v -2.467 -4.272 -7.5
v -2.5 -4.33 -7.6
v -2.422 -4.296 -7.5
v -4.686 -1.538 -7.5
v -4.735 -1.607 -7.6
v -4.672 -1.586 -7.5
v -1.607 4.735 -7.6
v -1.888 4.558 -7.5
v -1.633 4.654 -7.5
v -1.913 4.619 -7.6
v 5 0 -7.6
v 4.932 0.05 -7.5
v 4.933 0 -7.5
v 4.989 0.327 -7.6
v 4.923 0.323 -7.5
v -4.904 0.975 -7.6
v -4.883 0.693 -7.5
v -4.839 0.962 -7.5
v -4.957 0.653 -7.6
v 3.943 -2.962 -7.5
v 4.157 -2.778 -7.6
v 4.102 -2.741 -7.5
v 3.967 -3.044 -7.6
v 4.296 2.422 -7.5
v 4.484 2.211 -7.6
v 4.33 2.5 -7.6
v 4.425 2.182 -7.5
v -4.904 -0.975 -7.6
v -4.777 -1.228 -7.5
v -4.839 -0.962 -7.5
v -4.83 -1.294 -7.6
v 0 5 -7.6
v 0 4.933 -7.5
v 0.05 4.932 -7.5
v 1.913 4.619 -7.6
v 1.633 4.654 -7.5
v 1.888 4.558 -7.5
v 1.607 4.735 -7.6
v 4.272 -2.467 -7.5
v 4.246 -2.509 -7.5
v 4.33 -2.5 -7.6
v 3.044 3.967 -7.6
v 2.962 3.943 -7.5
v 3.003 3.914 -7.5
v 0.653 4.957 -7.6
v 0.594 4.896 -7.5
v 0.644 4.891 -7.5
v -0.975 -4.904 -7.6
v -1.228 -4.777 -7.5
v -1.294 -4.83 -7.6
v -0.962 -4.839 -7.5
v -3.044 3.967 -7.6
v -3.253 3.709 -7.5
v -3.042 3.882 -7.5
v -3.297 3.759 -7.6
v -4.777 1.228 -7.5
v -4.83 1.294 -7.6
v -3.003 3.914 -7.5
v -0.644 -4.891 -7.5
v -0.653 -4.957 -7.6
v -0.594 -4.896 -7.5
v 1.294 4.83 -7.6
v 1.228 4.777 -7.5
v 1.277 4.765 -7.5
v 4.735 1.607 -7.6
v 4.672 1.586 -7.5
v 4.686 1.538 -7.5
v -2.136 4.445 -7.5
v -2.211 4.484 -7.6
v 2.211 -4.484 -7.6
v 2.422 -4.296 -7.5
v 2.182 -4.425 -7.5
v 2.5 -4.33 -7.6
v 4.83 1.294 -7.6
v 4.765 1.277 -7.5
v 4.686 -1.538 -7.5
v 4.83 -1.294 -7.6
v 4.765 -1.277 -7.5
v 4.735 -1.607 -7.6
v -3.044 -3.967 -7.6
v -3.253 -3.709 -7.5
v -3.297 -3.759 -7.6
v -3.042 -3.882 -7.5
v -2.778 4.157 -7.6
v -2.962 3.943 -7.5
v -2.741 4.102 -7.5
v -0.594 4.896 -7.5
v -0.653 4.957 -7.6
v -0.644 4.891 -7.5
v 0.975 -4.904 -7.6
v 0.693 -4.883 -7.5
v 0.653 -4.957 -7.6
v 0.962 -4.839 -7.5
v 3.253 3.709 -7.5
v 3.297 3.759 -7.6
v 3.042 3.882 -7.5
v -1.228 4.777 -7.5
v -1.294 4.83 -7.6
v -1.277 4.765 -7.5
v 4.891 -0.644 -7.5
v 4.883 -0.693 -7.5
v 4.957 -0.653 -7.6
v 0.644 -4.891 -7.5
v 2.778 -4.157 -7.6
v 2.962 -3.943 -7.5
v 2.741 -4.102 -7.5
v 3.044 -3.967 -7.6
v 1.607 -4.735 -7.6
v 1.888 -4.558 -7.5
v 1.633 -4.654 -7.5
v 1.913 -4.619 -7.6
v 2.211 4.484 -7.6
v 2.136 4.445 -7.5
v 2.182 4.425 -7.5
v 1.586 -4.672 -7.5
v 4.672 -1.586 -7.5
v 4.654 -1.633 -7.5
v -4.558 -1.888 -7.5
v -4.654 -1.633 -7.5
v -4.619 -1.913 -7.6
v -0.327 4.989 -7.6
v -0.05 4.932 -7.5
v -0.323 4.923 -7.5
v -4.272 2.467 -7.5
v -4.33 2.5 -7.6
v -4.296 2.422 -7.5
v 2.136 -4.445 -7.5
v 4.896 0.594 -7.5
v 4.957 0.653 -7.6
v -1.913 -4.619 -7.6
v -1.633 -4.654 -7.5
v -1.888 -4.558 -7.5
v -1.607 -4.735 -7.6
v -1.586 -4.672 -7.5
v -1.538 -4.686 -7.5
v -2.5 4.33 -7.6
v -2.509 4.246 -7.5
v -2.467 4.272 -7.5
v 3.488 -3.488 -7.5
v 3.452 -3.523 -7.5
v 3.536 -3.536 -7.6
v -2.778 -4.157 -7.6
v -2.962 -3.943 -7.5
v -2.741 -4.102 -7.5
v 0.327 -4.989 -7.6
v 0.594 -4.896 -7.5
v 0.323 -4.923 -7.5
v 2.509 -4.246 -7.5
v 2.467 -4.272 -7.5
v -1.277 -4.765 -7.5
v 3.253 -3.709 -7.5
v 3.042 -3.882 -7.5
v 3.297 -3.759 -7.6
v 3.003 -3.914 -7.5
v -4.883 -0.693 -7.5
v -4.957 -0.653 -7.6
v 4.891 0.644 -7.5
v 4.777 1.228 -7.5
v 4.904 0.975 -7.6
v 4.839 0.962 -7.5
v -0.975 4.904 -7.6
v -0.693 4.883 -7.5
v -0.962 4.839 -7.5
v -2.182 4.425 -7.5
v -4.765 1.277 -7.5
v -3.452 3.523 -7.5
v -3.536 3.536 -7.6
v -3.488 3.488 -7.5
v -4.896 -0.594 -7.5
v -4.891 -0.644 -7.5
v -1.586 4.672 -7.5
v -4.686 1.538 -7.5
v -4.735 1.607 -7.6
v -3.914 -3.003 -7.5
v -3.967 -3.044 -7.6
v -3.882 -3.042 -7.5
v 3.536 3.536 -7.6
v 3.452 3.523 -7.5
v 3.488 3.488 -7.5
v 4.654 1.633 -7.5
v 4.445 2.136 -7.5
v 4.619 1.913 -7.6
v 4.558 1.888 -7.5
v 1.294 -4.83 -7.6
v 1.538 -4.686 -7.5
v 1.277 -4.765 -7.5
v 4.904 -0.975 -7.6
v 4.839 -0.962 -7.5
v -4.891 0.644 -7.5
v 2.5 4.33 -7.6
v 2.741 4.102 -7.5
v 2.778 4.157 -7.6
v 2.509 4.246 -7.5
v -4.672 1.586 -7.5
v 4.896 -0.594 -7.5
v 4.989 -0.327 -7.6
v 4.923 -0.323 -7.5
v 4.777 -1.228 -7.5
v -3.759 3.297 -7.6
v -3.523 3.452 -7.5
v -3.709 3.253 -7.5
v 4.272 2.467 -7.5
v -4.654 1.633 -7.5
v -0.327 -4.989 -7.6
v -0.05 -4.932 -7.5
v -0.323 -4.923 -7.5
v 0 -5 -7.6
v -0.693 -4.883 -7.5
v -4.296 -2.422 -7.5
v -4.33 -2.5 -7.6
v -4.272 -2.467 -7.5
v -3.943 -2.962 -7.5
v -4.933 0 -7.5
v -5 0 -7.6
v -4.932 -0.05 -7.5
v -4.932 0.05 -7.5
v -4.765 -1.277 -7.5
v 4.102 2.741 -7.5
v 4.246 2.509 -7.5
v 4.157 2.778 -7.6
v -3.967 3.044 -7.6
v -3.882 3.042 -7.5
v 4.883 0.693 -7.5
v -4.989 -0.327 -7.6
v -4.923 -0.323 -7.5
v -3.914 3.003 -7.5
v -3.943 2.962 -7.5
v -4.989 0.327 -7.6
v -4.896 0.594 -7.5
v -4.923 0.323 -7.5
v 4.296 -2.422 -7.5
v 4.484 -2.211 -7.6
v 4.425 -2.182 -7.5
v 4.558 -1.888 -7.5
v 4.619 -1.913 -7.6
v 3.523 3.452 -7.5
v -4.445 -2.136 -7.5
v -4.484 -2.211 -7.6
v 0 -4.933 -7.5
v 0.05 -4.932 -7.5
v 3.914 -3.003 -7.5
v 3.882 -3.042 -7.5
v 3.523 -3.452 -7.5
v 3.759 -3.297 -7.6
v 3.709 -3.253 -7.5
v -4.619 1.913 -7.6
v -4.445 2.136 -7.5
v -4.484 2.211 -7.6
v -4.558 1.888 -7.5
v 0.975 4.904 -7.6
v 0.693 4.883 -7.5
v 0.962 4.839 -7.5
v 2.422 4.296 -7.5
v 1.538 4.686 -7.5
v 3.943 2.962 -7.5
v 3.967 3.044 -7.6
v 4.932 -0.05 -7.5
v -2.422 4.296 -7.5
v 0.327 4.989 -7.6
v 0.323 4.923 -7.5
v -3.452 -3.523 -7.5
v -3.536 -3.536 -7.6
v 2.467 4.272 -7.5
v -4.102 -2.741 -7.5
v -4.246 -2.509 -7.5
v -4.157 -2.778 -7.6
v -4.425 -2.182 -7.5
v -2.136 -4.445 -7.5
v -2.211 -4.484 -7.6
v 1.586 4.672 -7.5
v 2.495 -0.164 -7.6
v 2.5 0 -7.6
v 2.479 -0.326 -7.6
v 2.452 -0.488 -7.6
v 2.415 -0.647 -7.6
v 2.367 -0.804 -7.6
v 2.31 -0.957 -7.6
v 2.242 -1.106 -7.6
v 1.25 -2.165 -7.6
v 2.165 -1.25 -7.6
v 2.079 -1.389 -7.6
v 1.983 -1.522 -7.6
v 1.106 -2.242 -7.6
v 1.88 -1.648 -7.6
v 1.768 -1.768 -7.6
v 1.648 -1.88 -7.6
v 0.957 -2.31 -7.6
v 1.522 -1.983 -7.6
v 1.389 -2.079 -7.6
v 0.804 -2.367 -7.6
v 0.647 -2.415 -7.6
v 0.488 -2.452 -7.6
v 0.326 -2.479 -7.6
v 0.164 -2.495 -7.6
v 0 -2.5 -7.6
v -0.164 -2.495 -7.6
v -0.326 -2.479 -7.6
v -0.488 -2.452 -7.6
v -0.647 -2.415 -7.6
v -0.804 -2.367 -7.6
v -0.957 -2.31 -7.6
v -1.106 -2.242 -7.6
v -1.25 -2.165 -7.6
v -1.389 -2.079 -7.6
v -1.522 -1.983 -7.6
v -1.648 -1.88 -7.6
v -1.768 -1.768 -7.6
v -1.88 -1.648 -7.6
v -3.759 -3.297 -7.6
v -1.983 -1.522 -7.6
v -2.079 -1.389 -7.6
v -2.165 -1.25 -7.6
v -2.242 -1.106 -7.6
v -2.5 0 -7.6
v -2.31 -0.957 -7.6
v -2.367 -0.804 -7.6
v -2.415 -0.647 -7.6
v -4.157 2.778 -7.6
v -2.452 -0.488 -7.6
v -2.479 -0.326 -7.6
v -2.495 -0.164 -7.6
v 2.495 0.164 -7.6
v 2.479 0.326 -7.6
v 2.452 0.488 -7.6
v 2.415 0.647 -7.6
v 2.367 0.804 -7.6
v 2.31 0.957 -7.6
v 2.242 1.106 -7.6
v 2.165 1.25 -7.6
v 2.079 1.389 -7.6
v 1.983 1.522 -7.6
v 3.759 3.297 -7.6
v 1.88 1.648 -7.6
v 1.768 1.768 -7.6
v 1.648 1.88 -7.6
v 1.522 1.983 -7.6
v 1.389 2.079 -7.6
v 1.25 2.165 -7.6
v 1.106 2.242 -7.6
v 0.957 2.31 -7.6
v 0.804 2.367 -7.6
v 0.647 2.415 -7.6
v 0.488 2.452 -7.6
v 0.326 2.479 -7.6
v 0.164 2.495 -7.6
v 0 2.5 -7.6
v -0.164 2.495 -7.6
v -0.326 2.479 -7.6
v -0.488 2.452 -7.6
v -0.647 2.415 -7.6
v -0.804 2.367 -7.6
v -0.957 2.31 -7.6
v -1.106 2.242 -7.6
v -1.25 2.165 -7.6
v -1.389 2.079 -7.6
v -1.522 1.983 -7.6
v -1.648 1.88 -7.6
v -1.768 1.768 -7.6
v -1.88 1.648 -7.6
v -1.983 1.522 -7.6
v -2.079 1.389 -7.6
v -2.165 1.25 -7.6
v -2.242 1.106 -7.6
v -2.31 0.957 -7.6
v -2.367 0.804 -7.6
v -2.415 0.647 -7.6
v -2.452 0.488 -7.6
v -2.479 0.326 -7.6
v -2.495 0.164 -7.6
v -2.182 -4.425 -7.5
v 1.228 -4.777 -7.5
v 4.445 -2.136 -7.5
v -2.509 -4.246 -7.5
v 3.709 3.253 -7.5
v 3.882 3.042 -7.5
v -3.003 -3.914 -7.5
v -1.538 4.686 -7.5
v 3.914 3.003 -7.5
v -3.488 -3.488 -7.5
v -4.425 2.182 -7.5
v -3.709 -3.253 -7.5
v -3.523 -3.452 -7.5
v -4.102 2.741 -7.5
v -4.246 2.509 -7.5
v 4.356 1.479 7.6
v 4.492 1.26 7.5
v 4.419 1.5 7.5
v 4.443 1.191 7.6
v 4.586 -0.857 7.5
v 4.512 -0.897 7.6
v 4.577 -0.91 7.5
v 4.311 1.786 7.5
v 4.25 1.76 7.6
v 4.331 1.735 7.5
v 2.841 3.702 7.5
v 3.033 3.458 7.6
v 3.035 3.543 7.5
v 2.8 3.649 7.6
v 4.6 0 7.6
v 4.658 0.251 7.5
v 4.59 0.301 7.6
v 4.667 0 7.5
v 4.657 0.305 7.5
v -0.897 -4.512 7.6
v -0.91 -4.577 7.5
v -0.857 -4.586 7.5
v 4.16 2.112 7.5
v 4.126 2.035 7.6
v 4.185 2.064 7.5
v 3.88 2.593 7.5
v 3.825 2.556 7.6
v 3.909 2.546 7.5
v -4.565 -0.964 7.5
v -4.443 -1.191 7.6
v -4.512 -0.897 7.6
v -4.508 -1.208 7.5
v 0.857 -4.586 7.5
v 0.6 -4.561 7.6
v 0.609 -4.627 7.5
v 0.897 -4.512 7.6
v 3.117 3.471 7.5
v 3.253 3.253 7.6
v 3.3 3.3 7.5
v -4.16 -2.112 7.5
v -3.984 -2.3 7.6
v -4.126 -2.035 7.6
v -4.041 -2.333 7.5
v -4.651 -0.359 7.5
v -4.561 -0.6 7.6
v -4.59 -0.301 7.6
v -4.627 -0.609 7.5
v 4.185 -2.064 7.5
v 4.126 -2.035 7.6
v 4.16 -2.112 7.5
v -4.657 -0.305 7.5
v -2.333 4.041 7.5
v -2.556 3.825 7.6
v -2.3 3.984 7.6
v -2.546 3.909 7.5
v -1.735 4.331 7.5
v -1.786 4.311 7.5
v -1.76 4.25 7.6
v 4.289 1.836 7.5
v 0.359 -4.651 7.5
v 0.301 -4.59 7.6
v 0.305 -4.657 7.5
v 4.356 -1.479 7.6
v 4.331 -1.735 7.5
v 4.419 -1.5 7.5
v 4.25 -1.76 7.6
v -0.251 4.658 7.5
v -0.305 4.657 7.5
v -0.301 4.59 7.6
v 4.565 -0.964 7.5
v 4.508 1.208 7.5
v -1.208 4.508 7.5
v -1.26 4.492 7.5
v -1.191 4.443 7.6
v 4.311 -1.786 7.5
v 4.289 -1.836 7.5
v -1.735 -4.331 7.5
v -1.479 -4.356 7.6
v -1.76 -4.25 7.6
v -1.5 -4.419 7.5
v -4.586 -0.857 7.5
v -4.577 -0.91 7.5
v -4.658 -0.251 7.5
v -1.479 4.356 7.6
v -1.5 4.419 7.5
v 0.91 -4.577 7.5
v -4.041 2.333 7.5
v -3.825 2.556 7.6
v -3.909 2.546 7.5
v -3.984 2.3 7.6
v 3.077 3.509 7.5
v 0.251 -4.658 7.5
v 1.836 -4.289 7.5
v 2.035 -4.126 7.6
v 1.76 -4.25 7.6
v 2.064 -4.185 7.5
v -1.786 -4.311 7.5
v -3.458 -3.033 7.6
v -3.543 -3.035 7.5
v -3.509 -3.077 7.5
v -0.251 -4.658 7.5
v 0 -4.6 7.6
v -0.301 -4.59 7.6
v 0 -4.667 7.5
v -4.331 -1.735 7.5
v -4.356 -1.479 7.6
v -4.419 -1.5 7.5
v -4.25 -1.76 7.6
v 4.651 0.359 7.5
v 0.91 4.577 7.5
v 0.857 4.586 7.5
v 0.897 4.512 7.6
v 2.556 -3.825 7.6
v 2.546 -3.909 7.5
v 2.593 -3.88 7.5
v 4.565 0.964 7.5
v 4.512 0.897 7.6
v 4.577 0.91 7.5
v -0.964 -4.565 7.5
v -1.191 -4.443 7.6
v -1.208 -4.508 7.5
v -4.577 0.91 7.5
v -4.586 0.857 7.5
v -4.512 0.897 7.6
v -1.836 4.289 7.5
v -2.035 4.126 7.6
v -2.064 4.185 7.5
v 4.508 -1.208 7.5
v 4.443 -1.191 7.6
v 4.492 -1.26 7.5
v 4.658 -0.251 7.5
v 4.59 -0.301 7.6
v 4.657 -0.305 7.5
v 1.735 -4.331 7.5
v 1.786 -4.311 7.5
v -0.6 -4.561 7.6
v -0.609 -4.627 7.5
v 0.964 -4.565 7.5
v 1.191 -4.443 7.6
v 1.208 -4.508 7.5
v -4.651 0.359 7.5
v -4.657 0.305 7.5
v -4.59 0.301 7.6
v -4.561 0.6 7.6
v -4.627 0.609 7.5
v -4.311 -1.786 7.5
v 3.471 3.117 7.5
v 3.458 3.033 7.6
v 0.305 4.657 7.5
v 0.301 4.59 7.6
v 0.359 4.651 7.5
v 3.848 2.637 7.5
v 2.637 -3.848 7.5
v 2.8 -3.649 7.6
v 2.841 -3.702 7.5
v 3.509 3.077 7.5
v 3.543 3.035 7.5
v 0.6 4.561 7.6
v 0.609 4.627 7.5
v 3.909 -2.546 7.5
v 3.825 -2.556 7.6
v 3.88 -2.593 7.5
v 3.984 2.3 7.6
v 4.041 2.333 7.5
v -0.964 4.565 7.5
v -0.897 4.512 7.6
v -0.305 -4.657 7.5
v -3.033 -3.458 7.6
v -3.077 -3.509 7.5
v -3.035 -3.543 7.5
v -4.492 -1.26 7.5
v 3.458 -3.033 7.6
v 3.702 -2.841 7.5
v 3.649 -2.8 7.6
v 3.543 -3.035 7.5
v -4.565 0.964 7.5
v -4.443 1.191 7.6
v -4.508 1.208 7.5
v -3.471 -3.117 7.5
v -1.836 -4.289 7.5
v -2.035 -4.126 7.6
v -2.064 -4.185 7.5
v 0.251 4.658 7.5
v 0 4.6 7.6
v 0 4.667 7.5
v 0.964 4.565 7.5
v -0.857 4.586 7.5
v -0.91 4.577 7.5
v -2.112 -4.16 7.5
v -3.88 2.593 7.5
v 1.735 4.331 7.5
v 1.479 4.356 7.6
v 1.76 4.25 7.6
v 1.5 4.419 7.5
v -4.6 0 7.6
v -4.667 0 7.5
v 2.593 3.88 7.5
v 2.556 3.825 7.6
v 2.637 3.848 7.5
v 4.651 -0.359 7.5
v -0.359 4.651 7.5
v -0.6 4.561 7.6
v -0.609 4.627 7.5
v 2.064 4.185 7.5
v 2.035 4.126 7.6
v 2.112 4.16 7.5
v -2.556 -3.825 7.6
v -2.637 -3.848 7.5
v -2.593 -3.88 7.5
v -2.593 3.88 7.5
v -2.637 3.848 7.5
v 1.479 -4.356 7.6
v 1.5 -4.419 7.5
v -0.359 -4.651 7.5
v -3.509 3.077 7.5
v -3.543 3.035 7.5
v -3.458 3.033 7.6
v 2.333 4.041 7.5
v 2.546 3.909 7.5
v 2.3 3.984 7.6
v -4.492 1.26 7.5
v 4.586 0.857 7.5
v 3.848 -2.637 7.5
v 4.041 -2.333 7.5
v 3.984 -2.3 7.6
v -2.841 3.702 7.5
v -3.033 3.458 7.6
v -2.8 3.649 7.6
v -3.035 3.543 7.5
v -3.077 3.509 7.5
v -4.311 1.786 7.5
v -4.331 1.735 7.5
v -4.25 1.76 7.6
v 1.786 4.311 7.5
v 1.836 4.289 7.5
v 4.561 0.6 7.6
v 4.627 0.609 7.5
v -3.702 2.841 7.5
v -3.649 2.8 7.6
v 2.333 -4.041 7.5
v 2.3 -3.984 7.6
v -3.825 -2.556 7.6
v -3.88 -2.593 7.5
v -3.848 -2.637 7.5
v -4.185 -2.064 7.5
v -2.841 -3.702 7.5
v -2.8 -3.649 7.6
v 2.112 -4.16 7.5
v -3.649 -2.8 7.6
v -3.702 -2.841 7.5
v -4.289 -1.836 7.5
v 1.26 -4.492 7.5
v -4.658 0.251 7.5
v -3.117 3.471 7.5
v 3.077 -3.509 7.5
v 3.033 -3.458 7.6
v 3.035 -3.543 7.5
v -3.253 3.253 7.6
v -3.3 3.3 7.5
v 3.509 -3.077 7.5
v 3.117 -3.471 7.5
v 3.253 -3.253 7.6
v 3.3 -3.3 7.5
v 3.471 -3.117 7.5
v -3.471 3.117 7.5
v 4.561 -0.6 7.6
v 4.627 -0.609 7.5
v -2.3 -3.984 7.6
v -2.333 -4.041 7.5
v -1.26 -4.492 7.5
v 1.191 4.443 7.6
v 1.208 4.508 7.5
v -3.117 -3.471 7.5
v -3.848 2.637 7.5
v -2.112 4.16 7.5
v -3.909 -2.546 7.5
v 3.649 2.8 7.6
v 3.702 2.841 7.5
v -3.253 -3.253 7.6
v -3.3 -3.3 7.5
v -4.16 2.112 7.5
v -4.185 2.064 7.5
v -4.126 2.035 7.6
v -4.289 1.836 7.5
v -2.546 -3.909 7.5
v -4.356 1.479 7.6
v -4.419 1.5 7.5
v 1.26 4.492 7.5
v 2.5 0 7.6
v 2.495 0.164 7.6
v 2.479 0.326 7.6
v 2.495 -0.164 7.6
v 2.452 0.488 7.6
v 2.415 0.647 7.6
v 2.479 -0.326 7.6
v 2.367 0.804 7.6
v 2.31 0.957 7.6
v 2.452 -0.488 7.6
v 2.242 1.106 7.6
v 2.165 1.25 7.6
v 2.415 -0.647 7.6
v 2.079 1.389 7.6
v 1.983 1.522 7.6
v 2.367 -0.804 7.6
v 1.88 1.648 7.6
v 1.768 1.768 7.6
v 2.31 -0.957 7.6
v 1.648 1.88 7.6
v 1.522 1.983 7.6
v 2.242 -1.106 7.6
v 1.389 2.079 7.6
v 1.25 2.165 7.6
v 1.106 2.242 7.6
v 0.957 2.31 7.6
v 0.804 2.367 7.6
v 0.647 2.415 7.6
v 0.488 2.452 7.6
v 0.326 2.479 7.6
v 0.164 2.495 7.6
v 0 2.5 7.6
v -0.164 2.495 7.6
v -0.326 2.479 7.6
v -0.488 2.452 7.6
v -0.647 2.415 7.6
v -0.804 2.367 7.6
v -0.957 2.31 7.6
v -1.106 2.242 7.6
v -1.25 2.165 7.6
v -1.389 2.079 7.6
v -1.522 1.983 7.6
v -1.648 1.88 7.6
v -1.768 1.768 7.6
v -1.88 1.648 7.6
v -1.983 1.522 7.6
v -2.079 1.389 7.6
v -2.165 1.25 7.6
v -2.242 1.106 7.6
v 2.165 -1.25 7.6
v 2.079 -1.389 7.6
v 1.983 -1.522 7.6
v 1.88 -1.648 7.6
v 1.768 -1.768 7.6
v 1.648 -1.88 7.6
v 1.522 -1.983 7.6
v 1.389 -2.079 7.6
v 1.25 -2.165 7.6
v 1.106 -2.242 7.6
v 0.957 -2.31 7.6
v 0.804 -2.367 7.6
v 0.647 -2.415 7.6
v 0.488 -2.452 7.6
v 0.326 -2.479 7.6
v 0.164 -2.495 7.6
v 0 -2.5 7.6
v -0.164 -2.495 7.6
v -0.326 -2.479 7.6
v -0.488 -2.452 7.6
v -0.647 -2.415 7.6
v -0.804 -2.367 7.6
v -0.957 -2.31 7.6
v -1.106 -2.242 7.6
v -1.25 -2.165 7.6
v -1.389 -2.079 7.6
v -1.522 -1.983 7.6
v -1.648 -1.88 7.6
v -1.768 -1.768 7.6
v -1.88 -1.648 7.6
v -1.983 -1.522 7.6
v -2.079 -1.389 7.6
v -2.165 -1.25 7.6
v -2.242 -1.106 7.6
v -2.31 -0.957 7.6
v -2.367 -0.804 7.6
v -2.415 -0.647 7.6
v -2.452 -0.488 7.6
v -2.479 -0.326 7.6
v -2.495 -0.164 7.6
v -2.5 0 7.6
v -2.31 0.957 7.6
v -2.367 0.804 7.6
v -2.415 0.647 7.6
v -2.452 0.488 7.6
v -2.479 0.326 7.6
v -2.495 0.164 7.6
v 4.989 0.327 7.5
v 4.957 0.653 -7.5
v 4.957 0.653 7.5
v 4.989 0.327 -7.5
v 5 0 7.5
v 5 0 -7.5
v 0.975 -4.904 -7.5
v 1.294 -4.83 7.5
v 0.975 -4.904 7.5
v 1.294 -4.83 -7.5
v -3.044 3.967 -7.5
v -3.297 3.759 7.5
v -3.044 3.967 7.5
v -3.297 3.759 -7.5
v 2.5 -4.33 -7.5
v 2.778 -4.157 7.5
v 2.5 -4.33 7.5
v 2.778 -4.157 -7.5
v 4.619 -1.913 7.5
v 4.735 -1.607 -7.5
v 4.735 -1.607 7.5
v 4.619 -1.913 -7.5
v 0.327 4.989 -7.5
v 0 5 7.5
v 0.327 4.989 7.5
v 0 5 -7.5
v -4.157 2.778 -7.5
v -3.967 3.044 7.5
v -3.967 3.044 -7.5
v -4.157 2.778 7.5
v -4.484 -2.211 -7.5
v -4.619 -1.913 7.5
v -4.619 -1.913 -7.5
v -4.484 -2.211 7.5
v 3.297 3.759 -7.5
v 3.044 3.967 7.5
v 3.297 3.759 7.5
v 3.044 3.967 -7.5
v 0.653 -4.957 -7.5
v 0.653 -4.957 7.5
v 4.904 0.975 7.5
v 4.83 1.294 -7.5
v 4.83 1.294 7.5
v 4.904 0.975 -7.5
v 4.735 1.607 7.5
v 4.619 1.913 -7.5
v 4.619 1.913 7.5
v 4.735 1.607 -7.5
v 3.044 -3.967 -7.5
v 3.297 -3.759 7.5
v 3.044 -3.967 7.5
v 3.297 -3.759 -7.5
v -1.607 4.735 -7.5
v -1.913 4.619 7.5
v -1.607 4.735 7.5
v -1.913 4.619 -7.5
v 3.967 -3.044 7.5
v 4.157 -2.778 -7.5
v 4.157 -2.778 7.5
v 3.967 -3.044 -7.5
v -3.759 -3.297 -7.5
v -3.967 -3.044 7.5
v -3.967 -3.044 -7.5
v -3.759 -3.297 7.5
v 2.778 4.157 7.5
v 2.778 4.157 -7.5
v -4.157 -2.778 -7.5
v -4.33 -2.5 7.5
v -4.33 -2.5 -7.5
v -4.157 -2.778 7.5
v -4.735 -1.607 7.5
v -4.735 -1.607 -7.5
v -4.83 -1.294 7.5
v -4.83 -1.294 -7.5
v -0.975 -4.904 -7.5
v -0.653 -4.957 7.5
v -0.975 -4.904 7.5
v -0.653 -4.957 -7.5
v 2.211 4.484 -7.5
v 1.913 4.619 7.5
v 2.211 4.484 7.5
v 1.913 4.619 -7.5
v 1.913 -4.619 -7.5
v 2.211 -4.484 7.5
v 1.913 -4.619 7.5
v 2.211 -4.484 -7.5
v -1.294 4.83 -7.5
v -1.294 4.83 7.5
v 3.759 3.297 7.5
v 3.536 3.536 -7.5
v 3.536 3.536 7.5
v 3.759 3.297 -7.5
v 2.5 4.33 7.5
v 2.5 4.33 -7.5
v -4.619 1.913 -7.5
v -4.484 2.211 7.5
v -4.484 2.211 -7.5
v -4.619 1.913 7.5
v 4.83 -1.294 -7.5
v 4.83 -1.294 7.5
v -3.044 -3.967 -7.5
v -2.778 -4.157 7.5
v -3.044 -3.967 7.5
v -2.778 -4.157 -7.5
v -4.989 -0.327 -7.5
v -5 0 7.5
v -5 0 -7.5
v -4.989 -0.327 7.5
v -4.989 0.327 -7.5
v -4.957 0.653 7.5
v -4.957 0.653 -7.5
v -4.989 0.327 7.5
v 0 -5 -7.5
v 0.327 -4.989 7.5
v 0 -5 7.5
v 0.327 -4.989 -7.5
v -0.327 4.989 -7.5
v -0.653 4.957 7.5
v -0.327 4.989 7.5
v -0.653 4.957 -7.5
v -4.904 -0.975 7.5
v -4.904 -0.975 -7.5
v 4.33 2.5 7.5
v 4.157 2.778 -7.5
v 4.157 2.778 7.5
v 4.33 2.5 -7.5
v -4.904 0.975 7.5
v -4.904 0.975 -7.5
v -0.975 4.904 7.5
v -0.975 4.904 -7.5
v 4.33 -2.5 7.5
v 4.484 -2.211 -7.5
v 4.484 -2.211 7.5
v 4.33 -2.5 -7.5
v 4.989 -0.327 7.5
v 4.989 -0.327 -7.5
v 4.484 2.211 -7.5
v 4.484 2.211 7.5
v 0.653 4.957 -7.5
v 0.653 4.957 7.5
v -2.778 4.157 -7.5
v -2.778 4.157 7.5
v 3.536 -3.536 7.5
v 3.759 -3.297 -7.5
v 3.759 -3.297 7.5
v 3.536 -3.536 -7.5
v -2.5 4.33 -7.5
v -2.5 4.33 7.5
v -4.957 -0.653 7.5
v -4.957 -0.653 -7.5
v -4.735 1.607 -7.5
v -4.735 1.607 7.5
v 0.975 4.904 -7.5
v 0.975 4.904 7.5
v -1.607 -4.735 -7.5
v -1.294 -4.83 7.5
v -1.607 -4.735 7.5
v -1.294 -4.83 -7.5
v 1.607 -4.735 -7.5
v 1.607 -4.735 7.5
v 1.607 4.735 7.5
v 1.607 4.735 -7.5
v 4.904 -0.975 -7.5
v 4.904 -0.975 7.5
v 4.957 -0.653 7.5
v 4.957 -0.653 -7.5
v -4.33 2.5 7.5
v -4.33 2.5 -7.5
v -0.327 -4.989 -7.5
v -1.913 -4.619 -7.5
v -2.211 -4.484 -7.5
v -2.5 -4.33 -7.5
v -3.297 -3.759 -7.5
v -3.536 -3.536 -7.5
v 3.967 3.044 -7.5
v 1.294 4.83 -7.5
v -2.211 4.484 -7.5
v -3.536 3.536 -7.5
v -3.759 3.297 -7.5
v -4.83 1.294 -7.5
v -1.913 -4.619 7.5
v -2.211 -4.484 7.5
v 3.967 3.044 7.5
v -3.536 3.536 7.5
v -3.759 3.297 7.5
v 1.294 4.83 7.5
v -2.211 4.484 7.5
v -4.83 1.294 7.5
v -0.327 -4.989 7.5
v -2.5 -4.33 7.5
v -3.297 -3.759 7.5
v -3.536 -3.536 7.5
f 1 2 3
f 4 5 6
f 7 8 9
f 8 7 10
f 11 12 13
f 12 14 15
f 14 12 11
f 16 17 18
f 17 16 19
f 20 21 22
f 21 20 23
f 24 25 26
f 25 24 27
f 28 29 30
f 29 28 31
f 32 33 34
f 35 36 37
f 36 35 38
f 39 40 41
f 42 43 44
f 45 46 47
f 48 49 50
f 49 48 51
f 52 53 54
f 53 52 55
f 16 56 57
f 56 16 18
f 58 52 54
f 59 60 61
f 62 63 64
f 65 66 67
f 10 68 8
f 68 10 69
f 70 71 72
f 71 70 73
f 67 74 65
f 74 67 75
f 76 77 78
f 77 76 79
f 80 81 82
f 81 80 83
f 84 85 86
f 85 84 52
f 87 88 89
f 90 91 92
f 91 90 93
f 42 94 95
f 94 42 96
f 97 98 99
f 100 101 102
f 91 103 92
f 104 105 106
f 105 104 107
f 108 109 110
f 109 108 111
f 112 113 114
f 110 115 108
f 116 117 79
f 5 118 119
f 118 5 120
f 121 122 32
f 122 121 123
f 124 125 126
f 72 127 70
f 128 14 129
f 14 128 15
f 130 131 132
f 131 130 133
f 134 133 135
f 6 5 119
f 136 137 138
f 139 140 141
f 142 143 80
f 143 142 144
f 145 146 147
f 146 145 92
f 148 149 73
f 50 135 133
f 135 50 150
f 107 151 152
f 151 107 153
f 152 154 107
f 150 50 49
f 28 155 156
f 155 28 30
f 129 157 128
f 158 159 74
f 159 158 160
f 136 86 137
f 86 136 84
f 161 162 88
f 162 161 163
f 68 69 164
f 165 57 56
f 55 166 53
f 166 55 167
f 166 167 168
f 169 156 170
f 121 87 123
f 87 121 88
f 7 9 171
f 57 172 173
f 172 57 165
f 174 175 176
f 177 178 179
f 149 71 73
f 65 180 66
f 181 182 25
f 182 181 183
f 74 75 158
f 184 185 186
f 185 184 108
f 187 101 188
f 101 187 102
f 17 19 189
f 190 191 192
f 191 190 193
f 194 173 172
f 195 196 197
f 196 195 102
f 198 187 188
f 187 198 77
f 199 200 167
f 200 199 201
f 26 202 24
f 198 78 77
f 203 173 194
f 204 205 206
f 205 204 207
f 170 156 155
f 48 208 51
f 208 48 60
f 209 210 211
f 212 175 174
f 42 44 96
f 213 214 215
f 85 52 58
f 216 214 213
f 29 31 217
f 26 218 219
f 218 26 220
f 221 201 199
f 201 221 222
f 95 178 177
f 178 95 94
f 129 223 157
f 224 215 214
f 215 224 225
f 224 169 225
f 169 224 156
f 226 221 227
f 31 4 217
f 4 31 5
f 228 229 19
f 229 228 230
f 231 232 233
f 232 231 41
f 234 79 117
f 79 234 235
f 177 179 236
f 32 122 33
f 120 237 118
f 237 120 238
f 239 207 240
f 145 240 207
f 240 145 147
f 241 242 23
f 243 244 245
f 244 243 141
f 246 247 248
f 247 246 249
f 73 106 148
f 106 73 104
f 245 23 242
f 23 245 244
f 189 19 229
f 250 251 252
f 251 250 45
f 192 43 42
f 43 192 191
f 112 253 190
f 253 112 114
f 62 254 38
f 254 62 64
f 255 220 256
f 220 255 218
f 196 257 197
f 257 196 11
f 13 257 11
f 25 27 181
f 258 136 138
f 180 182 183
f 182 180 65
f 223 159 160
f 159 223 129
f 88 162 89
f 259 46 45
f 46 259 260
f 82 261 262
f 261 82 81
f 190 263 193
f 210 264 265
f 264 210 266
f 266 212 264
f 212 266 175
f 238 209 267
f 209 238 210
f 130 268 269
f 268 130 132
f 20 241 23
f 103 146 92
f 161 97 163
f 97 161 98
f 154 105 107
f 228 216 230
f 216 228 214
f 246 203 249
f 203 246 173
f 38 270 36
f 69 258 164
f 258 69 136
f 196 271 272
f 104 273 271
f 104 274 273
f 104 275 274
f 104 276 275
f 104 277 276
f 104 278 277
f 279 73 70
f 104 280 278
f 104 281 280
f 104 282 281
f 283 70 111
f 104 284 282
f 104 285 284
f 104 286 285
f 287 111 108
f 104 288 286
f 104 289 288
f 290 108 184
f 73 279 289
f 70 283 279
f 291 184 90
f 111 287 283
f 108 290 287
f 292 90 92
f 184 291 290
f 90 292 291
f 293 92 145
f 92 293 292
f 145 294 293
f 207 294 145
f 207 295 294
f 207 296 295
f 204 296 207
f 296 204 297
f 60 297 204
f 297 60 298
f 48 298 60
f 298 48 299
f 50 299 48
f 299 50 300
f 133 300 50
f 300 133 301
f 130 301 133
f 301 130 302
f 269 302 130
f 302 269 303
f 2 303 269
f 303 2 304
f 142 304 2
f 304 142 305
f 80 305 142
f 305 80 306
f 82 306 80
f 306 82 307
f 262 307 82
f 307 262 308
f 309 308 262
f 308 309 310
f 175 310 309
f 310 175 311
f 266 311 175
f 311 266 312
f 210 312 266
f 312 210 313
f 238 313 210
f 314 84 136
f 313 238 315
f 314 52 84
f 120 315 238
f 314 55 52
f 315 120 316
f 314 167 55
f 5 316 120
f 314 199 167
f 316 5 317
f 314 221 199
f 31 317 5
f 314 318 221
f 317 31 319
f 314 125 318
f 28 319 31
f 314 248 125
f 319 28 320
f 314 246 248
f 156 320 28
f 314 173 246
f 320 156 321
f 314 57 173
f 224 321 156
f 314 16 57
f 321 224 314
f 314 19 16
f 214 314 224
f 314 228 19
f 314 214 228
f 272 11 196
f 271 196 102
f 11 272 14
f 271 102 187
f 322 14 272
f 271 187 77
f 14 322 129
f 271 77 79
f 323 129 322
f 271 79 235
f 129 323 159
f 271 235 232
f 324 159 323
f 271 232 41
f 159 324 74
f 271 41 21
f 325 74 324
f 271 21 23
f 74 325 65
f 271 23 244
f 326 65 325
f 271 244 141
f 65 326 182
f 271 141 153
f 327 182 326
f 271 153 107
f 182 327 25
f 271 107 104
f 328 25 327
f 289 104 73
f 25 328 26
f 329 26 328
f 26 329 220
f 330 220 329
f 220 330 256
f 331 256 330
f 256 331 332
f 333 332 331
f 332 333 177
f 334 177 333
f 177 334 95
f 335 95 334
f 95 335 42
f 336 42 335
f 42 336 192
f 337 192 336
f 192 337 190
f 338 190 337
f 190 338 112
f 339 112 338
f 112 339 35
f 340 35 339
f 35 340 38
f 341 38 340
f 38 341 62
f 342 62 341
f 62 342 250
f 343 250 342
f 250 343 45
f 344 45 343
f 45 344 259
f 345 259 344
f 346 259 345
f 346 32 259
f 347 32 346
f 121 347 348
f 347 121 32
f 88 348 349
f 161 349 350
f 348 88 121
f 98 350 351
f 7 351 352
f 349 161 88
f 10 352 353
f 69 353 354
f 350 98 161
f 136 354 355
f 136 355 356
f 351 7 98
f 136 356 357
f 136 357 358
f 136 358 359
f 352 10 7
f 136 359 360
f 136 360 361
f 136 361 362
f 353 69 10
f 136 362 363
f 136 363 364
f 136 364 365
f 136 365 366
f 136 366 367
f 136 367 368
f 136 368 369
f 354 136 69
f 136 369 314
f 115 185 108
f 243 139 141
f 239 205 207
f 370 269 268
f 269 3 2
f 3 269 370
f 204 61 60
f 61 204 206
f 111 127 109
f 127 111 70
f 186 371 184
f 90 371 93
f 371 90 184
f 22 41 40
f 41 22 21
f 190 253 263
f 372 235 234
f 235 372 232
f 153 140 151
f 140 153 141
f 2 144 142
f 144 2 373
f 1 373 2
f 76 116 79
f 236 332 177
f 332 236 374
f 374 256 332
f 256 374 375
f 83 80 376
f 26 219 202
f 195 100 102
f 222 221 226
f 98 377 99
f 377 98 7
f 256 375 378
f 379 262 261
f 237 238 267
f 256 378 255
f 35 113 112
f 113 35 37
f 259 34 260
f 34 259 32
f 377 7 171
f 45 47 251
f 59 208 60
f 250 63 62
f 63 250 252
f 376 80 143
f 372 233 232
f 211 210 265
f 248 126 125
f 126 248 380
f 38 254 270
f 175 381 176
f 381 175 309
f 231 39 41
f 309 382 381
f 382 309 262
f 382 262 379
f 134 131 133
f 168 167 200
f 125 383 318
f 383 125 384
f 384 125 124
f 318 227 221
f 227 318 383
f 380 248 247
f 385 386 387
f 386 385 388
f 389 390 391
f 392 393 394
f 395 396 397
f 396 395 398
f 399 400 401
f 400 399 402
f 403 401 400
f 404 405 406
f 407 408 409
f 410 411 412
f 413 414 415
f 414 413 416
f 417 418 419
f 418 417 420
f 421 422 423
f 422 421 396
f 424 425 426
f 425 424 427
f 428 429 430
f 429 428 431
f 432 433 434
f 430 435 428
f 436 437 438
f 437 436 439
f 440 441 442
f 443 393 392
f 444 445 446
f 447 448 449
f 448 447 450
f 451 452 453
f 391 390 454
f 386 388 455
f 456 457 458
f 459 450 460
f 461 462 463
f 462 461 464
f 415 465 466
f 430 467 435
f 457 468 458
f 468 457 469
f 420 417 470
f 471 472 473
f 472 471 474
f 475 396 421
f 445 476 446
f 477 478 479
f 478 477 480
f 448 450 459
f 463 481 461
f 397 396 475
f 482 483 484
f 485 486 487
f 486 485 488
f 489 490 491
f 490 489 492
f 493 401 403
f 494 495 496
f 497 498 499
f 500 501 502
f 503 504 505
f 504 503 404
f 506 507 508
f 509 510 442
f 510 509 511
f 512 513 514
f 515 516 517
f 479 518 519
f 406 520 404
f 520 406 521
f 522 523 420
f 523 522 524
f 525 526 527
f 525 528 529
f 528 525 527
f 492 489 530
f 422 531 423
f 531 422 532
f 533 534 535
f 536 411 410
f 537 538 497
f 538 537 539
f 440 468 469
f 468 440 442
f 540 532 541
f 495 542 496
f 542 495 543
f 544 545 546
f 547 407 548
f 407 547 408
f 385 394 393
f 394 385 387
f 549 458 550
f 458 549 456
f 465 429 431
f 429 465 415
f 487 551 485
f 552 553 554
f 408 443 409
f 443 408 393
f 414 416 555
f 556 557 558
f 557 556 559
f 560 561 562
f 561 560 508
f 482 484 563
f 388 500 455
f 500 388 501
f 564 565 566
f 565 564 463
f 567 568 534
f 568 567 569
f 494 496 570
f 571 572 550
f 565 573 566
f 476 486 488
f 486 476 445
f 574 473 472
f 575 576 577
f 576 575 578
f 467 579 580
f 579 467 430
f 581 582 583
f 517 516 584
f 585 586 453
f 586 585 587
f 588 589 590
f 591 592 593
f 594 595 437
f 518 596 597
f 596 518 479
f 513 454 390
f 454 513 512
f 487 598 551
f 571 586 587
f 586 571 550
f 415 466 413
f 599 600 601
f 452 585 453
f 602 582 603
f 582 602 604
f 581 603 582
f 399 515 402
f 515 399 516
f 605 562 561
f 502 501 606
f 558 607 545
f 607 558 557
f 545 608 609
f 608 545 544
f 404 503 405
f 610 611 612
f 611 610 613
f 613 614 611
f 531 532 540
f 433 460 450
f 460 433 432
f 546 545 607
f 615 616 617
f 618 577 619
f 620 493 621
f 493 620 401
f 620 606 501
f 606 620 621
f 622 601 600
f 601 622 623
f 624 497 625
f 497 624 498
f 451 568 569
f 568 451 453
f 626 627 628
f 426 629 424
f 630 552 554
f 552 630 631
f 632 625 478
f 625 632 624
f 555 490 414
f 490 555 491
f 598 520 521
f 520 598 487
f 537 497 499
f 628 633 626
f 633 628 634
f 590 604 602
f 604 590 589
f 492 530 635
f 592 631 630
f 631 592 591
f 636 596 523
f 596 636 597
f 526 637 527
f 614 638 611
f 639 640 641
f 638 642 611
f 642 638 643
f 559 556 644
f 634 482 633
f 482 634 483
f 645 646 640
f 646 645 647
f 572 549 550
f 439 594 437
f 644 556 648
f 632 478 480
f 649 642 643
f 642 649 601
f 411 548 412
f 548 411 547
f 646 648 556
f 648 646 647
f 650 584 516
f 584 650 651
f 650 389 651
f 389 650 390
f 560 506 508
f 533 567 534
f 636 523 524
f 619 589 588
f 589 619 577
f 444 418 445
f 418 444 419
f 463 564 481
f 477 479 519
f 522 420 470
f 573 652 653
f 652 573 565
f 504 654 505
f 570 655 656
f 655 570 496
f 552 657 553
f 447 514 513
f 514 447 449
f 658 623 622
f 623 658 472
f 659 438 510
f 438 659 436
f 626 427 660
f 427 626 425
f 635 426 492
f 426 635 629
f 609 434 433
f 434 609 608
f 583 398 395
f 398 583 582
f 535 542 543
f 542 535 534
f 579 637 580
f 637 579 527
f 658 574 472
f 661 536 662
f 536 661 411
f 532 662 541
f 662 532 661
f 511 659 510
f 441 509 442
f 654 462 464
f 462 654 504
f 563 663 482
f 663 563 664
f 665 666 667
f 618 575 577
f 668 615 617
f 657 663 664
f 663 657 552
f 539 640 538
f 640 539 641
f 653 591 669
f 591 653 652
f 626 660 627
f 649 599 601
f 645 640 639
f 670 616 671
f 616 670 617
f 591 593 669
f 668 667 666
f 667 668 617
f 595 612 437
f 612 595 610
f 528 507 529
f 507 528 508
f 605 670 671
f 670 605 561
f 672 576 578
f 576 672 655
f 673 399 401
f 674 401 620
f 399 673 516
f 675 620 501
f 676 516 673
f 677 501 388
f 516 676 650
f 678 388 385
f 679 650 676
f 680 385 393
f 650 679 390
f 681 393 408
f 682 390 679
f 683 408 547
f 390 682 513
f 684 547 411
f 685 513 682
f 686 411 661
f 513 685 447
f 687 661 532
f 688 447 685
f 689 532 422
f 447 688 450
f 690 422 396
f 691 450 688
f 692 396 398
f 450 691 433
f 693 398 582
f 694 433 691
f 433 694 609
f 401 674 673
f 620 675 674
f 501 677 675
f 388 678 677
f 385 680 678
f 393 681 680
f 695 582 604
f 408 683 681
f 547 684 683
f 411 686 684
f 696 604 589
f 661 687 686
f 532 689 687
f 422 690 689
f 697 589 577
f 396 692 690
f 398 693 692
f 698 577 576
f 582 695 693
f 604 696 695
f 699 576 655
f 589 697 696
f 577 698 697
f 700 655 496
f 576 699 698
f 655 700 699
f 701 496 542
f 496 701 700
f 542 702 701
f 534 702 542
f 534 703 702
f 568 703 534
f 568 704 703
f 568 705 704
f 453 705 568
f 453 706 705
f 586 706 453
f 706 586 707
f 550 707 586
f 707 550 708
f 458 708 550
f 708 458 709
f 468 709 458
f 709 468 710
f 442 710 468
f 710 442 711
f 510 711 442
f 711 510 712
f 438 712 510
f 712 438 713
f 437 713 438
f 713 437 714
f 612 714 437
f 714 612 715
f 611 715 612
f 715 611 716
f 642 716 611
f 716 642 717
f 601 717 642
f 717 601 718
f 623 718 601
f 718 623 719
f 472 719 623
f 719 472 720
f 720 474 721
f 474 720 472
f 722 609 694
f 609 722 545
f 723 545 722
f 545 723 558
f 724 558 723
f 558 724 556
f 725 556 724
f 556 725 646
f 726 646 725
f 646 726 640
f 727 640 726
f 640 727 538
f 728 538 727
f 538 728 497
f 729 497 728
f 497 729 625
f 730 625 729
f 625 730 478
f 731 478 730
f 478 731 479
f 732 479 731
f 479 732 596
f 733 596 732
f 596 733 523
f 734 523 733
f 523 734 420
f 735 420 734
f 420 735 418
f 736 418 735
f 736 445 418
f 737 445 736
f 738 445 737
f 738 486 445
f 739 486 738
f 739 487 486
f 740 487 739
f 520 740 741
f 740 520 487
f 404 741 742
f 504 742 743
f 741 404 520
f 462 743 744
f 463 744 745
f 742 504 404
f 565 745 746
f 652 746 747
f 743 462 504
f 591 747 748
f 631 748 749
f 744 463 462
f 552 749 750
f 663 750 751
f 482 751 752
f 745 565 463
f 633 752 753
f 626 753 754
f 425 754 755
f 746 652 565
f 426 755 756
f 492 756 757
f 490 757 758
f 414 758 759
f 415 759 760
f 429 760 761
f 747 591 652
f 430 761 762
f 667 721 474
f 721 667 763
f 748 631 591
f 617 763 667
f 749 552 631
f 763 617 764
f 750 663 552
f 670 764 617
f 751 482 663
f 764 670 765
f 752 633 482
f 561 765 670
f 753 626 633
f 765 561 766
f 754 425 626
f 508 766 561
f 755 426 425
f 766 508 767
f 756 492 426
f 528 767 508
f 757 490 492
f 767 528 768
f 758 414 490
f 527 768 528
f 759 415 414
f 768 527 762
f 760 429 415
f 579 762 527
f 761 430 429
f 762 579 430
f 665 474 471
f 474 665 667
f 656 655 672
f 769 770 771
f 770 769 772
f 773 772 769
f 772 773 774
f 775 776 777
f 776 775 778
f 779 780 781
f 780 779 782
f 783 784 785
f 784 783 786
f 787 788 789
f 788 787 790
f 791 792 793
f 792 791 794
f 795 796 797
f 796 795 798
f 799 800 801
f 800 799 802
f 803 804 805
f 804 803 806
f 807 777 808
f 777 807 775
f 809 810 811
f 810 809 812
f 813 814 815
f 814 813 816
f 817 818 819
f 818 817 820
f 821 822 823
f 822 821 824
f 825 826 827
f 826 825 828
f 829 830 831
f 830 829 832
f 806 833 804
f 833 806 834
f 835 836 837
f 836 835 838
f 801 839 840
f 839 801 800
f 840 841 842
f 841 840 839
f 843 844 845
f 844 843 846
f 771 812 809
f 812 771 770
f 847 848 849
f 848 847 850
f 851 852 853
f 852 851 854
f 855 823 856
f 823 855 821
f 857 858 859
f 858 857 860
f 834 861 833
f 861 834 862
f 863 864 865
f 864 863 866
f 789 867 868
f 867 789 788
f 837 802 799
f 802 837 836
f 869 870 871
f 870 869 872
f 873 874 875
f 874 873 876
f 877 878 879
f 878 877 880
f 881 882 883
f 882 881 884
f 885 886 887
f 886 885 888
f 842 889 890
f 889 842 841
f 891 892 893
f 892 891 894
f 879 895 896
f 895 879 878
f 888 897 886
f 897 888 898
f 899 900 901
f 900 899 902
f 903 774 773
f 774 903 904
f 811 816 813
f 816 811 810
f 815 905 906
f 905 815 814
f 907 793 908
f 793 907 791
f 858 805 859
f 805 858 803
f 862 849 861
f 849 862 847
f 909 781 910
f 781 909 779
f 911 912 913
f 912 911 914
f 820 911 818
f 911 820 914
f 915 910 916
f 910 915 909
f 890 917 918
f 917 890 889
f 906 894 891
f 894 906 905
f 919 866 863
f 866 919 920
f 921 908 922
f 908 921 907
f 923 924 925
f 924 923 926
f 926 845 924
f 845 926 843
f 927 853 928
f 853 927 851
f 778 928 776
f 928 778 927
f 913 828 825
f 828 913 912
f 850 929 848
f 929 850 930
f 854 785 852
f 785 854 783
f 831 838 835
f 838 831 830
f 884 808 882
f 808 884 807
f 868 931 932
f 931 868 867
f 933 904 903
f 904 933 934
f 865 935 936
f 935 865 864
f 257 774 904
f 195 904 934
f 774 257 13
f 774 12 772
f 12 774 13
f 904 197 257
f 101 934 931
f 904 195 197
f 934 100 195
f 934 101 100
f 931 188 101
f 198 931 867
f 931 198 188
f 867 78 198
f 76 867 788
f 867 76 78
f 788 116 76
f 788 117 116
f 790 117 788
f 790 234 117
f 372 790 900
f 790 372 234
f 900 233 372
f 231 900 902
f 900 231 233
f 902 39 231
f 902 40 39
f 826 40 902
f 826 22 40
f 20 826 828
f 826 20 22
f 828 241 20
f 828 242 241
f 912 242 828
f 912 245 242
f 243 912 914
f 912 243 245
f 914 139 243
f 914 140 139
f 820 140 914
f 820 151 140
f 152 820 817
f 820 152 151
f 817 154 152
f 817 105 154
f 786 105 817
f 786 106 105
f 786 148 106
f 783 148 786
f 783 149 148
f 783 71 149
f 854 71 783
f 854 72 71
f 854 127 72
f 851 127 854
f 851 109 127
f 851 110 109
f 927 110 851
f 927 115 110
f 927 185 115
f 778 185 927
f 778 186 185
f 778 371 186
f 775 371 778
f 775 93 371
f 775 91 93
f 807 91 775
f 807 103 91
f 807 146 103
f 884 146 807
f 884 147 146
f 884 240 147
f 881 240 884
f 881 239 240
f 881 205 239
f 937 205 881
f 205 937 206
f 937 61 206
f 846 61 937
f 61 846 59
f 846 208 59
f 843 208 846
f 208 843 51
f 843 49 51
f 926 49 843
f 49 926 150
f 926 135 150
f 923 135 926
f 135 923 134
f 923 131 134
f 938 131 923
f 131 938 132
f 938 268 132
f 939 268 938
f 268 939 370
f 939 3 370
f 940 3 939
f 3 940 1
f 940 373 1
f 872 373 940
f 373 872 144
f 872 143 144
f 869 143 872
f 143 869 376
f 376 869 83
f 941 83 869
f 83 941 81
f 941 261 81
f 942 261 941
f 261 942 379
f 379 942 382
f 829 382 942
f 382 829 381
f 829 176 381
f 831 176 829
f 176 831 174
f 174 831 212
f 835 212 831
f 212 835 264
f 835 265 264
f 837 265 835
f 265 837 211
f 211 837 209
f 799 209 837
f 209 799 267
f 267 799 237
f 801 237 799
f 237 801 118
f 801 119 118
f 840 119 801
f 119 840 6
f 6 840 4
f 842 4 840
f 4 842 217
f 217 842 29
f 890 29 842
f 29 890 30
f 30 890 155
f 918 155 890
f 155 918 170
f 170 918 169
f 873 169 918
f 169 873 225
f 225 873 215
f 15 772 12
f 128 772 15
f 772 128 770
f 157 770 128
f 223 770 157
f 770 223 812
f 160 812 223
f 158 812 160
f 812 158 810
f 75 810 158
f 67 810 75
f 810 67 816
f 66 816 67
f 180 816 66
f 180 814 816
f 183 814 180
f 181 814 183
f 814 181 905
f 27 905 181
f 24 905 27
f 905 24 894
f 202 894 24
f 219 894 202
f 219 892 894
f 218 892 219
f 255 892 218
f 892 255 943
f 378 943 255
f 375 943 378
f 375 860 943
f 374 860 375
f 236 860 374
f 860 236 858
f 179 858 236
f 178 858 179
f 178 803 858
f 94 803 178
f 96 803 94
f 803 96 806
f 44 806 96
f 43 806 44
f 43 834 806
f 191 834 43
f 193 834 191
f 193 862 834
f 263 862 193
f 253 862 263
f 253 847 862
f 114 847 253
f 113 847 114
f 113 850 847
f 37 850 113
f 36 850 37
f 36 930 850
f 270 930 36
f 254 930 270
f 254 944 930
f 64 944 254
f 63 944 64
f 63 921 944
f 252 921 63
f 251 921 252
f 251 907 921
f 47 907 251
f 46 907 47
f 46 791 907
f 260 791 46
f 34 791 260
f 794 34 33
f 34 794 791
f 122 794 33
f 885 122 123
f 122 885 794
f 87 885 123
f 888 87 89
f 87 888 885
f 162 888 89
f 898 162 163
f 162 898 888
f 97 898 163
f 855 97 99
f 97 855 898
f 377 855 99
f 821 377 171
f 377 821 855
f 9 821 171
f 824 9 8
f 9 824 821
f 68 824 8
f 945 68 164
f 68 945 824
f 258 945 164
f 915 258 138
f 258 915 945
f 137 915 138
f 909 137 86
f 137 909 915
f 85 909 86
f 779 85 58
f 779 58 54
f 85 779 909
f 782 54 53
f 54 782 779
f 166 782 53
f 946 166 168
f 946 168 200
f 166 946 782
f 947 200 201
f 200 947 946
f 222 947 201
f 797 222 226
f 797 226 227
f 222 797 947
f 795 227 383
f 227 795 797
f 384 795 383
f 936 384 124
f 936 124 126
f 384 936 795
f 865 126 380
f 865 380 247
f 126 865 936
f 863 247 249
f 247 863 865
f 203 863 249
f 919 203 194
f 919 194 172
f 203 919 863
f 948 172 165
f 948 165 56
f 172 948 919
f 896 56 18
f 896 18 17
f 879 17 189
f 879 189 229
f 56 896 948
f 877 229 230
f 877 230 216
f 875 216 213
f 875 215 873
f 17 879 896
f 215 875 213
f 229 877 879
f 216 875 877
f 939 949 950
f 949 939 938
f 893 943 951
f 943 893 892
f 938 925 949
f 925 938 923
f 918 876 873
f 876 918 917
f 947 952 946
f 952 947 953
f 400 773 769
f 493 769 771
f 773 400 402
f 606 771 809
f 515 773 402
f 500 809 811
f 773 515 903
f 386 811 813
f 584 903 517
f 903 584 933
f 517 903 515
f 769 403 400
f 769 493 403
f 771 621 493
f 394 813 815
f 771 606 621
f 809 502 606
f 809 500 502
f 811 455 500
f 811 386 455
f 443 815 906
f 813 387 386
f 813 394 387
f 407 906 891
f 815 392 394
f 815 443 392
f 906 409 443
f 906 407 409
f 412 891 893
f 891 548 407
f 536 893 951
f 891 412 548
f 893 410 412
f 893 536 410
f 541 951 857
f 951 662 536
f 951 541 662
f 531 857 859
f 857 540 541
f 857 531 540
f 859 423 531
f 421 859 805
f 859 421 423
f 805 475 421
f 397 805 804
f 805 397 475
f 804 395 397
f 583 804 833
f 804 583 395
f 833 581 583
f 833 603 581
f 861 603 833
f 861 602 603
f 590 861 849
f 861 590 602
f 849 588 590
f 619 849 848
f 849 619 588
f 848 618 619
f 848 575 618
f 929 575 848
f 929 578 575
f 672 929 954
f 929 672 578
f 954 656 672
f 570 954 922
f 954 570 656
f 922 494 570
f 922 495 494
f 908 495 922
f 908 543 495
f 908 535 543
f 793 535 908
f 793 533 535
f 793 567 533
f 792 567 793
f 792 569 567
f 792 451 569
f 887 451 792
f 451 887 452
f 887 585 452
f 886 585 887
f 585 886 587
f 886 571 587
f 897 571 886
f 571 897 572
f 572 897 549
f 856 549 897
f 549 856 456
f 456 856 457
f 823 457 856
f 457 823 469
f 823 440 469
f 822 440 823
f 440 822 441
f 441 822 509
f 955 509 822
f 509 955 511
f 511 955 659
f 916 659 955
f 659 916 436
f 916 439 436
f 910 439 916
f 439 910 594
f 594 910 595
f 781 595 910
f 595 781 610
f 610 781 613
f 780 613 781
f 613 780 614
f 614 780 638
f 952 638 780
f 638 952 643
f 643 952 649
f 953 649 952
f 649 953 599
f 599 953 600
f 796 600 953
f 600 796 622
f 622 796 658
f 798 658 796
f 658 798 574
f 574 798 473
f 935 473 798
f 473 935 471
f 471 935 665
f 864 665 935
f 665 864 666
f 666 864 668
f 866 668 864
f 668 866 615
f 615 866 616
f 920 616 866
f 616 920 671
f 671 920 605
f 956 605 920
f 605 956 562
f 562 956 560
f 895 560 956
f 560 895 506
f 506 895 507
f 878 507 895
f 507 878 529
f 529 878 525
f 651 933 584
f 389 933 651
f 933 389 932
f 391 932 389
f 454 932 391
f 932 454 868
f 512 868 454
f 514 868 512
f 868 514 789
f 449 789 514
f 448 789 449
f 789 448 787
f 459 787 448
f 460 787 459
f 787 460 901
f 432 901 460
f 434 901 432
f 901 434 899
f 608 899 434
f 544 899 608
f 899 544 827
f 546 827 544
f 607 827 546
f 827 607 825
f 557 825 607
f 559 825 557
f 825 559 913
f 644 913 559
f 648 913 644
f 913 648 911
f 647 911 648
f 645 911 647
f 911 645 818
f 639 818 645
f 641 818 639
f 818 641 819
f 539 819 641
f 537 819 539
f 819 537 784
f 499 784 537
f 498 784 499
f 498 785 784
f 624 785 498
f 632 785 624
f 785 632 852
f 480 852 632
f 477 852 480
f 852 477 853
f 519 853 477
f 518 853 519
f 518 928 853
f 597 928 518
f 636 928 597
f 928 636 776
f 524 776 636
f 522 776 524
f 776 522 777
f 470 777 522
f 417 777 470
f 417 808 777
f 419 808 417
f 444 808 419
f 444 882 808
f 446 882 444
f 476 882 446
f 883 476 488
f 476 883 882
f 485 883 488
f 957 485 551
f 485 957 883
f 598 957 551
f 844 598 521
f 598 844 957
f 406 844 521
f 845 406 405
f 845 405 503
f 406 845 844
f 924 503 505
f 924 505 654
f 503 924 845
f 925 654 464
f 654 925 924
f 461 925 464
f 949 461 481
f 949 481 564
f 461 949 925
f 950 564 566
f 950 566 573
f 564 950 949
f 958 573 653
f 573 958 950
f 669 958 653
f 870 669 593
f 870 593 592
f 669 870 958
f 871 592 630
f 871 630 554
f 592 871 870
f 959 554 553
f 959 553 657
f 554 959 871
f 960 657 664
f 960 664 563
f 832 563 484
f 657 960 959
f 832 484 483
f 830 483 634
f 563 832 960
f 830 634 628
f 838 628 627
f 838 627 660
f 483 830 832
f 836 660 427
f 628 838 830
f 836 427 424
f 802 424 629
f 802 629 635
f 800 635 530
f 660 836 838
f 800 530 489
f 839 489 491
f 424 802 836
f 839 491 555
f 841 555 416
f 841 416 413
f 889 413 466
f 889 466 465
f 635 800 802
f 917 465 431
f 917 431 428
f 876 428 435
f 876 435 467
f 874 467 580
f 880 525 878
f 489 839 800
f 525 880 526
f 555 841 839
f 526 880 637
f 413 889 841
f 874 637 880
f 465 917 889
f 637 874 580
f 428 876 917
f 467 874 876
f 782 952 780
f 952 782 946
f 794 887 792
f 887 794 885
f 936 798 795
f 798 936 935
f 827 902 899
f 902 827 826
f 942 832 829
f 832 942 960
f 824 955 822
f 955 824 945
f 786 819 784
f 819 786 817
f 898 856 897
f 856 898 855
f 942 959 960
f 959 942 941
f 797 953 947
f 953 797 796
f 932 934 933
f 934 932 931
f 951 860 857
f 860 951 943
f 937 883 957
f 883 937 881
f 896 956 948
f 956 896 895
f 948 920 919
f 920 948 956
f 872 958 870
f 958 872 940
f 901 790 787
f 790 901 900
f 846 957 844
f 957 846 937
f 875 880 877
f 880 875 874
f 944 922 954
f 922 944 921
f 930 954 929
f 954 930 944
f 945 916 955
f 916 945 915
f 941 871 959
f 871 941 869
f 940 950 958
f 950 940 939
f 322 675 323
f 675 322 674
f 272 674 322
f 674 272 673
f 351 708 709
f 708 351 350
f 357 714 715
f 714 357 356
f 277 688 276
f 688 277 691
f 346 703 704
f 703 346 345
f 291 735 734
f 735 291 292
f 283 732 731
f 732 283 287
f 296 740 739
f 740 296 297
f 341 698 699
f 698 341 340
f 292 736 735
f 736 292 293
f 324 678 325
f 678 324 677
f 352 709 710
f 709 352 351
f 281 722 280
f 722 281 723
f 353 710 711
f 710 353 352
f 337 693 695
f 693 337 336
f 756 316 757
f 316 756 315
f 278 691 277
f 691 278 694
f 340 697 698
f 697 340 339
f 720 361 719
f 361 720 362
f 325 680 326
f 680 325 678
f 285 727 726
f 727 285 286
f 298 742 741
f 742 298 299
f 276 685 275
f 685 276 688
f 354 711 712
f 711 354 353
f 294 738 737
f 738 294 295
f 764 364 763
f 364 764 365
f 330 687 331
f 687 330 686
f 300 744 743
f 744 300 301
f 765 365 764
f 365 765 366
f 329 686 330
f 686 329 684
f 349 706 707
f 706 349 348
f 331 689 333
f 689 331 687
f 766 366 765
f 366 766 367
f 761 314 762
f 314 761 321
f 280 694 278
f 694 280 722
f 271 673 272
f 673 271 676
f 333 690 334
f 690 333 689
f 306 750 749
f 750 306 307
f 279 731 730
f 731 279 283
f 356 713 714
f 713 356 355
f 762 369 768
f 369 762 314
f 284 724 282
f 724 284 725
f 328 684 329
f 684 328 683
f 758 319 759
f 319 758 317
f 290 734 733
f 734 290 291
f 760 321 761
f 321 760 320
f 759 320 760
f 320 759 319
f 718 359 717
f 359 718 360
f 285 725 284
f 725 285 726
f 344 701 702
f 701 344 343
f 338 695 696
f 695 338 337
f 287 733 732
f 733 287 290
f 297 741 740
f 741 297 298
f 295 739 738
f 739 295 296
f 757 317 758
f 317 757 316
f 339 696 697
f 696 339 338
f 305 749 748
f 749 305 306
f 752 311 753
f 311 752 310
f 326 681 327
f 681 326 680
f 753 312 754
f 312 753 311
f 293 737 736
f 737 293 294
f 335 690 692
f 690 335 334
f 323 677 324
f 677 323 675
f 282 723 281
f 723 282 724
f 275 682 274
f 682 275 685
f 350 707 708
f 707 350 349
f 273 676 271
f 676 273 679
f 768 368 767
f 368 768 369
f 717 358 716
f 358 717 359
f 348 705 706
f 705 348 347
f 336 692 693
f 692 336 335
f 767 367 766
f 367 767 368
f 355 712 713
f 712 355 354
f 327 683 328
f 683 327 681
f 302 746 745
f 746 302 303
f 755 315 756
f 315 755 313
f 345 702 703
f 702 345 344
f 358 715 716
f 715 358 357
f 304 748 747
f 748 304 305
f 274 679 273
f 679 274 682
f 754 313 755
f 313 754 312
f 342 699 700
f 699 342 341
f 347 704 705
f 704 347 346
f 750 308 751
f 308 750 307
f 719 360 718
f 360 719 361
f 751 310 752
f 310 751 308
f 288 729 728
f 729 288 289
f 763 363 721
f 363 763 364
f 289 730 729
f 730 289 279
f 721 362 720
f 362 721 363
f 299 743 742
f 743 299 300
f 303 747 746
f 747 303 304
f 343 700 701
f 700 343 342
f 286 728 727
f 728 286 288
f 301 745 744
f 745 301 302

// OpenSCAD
// Linear bearing: 5.0mm bore, 10.0mm OD, 15.0mm length
bore_diameter_mm  = 5.0;   //[2.5:10.0:0.1]
outer_diameter_mm = 10.0;  //[5.0:20.0:0.1]
length_mm         = 15.0;  //[7.5:30.0:0.1]

// Optional small end chamfers (kept subtle; does not change main dimensions)
chamfer_mm = 0.4;          //[0:1.0:0.05]
overlap_mm = 0.2;          //[0.05:1.0:0.05]

$fn = 96;

module linear_bearing_5x10x15() {
    difference() {
        // Outer sleeve (single connected solid)
        union() {
            cylinder(d=outer_diameter_mm, h=length_mm, center=true);

            // Small end chamfers via tapered rings (connected by overlap)
            if (chamfer_mm > 0) {
                for (zsgn = [-1, 1]) {
                    translate([0, 0, zsgn*(length_mm/2 - chamfer_mm/2)])
                        cylinder(d1=outer_diameter_mm, d2=outer_diameter_mm - 2*chamfer_mm,
                                 h=chamfer_mm + overlap_mm, center=true);
                }
            }
        }

        // Through bore
        cylinder(d=bore_diameter_mm, h=length_mm + 2*overlap_mm, center=true);
    }
}

linear_bearing_5x10x15();
